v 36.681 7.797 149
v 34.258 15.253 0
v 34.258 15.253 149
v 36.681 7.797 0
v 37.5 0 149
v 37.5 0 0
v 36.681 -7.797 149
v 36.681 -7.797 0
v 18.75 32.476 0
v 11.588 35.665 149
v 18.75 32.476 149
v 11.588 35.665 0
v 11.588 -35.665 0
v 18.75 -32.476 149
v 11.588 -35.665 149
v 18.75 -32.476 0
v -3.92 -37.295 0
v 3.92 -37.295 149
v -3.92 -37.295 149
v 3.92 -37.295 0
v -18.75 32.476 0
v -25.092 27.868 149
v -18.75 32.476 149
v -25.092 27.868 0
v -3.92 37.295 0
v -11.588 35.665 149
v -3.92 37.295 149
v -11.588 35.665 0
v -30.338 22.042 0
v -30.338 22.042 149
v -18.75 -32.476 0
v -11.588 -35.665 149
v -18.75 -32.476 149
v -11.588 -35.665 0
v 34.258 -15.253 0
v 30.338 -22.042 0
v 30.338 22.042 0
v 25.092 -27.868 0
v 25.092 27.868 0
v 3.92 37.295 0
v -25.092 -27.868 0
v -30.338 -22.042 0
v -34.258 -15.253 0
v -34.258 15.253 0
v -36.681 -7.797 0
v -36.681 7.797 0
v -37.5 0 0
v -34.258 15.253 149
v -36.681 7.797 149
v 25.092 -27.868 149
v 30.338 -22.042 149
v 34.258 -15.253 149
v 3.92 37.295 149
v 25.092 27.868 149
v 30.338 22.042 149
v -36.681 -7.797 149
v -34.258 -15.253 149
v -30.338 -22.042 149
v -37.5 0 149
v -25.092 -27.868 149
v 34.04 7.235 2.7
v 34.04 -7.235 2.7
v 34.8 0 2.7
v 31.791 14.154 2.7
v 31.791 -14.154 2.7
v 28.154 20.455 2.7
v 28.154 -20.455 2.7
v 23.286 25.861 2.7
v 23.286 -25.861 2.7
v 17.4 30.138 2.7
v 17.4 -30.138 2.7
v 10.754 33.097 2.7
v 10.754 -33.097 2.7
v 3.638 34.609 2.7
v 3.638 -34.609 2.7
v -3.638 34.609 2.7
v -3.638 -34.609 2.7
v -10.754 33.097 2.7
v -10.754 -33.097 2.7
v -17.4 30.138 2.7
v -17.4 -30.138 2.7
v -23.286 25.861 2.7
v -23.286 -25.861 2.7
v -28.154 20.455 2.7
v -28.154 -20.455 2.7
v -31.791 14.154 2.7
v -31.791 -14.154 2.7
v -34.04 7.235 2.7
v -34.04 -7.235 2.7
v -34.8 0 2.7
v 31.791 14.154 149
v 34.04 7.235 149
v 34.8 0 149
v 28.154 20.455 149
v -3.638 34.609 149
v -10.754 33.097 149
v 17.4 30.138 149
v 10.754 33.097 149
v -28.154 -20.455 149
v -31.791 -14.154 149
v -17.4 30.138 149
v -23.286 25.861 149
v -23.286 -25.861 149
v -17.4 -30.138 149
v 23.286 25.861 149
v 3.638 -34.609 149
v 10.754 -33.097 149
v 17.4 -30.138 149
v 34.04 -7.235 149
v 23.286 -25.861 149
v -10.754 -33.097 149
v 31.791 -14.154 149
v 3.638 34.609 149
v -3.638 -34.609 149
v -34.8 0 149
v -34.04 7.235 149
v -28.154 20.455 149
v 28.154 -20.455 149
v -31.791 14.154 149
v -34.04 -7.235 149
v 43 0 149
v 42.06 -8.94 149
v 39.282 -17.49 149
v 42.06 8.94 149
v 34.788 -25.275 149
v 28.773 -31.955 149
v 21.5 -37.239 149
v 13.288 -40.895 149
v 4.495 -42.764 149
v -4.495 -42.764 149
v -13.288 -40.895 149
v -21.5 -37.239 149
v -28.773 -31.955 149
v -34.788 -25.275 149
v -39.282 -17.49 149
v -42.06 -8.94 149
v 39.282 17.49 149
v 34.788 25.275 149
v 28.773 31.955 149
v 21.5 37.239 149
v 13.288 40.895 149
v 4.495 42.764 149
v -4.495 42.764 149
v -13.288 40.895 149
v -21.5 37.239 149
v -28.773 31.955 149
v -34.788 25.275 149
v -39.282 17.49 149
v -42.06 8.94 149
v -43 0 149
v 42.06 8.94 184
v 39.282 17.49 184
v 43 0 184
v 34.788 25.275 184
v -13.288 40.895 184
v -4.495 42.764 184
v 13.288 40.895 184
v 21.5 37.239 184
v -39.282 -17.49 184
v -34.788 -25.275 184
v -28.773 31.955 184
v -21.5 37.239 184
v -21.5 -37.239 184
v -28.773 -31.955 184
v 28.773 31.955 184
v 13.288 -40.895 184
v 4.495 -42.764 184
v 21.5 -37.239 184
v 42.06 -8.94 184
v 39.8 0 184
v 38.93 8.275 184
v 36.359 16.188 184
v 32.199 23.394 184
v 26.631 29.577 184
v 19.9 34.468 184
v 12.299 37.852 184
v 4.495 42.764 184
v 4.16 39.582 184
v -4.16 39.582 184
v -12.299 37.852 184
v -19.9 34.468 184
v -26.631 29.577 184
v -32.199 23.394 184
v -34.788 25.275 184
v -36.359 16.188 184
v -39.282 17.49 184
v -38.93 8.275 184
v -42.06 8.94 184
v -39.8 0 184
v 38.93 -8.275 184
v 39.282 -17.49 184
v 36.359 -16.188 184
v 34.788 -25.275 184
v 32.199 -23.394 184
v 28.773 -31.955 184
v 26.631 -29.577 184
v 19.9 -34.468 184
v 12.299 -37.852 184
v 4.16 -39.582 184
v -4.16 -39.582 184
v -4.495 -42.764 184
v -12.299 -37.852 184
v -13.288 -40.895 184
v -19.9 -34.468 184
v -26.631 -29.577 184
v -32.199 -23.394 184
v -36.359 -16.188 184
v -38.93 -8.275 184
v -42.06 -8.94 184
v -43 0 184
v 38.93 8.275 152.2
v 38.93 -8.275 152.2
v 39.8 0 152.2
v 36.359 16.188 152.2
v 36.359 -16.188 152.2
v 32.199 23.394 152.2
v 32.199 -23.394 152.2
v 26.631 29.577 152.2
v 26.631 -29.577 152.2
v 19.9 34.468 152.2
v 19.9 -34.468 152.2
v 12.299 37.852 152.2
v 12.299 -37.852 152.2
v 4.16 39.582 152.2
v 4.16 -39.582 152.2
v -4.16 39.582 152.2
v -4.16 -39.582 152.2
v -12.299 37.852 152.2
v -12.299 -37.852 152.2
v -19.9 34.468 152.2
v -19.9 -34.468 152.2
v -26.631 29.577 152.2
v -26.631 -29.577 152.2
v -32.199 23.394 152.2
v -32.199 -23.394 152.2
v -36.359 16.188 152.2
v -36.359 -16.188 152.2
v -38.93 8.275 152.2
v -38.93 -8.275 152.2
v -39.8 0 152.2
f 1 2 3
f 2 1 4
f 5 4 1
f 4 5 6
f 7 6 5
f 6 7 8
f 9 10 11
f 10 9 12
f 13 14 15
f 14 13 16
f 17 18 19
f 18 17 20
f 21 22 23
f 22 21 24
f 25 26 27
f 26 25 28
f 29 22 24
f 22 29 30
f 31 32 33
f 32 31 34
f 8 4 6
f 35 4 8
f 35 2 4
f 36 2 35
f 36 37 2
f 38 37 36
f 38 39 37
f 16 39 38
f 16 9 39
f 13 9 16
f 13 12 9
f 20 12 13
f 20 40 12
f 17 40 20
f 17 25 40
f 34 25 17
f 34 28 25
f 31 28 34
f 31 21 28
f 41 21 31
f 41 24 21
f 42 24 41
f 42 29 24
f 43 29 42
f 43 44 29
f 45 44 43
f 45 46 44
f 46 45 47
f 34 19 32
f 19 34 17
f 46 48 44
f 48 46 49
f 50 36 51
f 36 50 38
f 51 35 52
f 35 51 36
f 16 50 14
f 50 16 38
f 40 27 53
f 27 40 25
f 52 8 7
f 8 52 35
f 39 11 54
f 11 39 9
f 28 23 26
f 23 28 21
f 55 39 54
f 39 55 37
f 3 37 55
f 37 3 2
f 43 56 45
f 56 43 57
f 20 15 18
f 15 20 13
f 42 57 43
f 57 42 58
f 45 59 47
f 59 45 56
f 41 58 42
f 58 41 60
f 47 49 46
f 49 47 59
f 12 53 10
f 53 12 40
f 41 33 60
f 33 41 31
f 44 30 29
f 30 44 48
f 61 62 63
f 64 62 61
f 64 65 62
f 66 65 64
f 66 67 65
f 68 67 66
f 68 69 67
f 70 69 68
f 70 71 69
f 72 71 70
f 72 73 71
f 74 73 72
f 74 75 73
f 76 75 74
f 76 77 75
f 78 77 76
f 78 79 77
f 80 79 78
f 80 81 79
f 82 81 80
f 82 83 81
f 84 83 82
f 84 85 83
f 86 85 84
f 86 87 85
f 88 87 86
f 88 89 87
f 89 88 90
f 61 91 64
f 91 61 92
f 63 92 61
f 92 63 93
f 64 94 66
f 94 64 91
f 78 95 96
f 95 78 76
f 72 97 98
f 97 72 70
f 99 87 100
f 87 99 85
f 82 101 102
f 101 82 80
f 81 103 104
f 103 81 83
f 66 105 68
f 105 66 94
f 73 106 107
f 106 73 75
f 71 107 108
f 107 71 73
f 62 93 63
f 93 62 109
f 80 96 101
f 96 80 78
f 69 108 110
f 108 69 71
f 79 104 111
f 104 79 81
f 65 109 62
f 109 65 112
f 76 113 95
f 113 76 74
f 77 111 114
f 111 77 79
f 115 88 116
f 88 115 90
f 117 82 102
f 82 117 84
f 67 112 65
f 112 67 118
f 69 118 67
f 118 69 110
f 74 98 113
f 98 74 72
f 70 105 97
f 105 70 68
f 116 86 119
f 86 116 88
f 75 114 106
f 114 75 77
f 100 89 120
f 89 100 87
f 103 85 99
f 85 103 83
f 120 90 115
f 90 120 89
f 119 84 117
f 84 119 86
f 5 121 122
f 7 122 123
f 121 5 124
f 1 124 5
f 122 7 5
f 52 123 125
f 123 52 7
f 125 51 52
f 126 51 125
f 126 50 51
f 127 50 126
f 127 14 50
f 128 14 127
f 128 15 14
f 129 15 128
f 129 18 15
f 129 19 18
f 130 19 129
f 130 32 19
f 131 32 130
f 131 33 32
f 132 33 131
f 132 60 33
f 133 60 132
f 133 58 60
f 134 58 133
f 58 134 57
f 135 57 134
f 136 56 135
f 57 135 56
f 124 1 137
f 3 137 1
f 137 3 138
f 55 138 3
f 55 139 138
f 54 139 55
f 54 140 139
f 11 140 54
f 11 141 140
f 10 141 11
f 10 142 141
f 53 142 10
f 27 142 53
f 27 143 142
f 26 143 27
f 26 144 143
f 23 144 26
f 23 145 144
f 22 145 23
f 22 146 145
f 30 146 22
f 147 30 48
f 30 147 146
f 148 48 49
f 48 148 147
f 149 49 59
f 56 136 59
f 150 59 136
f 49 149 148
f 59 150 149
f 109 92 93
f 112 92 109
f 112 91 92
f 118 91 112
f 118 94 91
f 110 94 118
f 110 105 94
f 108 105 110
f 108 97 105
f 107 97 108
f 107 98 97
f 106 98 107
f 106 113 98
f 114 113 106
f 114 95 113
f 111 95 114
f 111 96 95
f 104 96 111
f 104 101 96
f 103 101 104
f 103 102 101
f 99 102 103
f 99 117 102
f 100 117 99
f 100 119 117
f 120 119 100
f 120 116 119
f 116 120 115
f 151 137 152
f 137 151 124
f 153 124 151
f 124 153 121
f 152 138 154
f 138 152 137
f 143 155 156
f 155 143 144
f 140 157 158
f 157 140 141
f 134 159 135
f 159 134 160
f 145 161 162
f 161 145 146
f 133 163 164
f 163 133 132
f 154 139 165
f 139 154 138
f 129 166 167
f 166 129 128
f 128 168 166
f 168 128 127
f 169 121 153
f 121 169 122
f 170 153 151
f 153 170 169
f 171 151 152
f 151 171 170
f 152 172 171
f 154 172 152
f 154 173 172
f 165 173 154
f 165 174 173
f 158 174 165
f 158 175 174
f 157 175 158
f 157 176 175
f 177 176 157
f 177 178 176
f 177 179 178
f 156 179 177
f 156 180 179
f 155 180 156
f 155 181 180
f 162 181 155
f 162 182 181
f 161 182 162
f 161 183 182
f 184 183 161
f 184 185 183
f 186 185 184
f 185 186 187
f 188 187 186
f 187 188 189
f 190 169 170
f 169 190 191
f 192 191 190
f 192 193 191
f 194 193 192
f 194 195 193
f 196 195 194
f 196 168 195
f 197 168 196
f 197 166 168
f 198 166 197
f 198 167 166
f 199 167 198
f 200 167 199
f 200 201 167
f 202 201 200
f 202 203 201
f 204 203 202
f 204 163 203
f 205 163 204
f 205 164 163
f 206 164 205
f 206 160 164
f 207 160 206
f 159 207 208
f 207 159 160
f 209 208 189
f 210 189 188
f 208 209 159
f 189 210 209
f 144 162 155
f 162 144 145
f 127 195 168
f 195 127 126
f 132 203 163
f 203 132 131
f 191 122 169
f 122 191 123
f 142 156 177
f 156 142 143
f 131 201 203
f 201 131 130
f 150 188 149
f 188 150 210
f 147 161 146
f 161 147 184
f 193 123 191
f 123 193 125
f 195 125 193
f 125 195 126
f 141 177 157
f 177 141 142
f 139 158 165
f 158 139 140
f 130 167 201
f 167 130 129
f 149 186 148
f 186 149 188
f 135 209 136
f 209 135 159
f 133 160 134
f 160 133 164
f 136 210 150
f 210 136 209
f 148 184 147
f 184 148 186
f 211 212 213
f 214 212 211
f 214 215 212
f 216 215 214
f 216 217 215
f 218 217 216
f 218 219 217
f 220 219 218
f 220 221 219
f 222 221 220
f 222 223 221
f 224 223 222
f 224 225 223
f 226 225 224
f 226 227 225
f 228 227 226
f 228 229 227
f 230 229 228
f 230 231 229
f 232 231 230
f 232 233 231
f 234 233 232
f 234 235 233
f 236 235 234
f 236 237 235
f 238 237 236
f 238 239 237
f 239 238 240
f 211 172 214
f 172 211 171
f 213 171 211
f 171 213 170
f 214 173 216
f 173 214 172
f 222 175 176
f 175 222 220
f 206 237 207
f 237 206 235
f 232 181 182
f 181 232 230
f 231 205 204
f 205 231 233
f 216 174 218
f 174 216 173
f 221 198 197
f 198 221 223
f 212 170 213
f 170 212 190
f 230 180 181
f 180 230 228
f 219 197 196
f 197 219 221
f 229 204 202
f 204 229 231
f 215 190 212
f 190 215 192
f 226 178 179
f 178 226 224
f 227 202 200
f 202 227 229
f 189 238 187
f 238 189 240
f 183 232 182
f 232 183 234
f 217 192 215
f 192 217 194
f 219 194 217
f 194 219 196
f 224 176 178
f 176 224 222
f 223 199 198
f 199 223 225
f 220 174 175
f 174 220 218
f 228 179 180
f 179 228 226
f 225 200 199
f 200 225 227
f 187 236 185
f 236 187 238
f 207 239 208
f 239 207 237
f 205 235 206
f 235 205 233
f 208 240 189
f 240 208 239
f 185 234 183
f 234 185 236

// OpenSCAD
// Parameters
pipe_standard = 1; //[1:1:1]
nominal_diameter = 75; //[40:160:1]
length_mm = 150; //[75:300:1]
include_end_fitting = 1; //[0:1:1]
pipe_od = 75; //[40:160:1]
pipe_wall = 2.7; //[1.5:5.5:0.1]
tube_id = 69.6; //[30:155:0.1]
fitting_length = 35; //[20:70:1]
fitting_od = 86; //[60:140:1]
fitting_wall = 3.2; //[2:7:0.1]
fitting_id = 79.6; //[40:160:0.1]
fitting_overlap = 1; //[0.5:2:0.1]
fitting_stop_thickness = 2; //[1:5:0.5]
fitting_stop_depth = 12; //[6:25:1]

// Ht Pipe - complete geometry
module ht_pipe() {
  color([0.85, 0.85, 0.8]) {
    // Main pipe body
    difference() {
      cylinder(h=length_mm, r=pipe_od/2, center=false);
      translate([0, 0, pipe_wall])
        cylinder(h=length_mm, r=tube_id/2, center=false);
    }
    
    // End fitting
    if (include_end_fitting) {
      difference() {
        translate([0, 0, length_mm - fitting_overlap])
          cylinder(h=fitting_length, r=fitting_od/2, center=false);
        translate([0, 0, length_mm - fitting_overlap + fitting_wall])
          cylinder(h=fitting_length, r=fitting_id/2, center=false);
        translate([0, 0, length_mm - fitting_overlap + fitting_stop_depth])
          cylinder(h=fitting_stop_thickness, r=fitting_id/2, center=false);
      }
    }
  }
}

// Assembly
module assembly() {
  ht_pipe();
}

assembly();
